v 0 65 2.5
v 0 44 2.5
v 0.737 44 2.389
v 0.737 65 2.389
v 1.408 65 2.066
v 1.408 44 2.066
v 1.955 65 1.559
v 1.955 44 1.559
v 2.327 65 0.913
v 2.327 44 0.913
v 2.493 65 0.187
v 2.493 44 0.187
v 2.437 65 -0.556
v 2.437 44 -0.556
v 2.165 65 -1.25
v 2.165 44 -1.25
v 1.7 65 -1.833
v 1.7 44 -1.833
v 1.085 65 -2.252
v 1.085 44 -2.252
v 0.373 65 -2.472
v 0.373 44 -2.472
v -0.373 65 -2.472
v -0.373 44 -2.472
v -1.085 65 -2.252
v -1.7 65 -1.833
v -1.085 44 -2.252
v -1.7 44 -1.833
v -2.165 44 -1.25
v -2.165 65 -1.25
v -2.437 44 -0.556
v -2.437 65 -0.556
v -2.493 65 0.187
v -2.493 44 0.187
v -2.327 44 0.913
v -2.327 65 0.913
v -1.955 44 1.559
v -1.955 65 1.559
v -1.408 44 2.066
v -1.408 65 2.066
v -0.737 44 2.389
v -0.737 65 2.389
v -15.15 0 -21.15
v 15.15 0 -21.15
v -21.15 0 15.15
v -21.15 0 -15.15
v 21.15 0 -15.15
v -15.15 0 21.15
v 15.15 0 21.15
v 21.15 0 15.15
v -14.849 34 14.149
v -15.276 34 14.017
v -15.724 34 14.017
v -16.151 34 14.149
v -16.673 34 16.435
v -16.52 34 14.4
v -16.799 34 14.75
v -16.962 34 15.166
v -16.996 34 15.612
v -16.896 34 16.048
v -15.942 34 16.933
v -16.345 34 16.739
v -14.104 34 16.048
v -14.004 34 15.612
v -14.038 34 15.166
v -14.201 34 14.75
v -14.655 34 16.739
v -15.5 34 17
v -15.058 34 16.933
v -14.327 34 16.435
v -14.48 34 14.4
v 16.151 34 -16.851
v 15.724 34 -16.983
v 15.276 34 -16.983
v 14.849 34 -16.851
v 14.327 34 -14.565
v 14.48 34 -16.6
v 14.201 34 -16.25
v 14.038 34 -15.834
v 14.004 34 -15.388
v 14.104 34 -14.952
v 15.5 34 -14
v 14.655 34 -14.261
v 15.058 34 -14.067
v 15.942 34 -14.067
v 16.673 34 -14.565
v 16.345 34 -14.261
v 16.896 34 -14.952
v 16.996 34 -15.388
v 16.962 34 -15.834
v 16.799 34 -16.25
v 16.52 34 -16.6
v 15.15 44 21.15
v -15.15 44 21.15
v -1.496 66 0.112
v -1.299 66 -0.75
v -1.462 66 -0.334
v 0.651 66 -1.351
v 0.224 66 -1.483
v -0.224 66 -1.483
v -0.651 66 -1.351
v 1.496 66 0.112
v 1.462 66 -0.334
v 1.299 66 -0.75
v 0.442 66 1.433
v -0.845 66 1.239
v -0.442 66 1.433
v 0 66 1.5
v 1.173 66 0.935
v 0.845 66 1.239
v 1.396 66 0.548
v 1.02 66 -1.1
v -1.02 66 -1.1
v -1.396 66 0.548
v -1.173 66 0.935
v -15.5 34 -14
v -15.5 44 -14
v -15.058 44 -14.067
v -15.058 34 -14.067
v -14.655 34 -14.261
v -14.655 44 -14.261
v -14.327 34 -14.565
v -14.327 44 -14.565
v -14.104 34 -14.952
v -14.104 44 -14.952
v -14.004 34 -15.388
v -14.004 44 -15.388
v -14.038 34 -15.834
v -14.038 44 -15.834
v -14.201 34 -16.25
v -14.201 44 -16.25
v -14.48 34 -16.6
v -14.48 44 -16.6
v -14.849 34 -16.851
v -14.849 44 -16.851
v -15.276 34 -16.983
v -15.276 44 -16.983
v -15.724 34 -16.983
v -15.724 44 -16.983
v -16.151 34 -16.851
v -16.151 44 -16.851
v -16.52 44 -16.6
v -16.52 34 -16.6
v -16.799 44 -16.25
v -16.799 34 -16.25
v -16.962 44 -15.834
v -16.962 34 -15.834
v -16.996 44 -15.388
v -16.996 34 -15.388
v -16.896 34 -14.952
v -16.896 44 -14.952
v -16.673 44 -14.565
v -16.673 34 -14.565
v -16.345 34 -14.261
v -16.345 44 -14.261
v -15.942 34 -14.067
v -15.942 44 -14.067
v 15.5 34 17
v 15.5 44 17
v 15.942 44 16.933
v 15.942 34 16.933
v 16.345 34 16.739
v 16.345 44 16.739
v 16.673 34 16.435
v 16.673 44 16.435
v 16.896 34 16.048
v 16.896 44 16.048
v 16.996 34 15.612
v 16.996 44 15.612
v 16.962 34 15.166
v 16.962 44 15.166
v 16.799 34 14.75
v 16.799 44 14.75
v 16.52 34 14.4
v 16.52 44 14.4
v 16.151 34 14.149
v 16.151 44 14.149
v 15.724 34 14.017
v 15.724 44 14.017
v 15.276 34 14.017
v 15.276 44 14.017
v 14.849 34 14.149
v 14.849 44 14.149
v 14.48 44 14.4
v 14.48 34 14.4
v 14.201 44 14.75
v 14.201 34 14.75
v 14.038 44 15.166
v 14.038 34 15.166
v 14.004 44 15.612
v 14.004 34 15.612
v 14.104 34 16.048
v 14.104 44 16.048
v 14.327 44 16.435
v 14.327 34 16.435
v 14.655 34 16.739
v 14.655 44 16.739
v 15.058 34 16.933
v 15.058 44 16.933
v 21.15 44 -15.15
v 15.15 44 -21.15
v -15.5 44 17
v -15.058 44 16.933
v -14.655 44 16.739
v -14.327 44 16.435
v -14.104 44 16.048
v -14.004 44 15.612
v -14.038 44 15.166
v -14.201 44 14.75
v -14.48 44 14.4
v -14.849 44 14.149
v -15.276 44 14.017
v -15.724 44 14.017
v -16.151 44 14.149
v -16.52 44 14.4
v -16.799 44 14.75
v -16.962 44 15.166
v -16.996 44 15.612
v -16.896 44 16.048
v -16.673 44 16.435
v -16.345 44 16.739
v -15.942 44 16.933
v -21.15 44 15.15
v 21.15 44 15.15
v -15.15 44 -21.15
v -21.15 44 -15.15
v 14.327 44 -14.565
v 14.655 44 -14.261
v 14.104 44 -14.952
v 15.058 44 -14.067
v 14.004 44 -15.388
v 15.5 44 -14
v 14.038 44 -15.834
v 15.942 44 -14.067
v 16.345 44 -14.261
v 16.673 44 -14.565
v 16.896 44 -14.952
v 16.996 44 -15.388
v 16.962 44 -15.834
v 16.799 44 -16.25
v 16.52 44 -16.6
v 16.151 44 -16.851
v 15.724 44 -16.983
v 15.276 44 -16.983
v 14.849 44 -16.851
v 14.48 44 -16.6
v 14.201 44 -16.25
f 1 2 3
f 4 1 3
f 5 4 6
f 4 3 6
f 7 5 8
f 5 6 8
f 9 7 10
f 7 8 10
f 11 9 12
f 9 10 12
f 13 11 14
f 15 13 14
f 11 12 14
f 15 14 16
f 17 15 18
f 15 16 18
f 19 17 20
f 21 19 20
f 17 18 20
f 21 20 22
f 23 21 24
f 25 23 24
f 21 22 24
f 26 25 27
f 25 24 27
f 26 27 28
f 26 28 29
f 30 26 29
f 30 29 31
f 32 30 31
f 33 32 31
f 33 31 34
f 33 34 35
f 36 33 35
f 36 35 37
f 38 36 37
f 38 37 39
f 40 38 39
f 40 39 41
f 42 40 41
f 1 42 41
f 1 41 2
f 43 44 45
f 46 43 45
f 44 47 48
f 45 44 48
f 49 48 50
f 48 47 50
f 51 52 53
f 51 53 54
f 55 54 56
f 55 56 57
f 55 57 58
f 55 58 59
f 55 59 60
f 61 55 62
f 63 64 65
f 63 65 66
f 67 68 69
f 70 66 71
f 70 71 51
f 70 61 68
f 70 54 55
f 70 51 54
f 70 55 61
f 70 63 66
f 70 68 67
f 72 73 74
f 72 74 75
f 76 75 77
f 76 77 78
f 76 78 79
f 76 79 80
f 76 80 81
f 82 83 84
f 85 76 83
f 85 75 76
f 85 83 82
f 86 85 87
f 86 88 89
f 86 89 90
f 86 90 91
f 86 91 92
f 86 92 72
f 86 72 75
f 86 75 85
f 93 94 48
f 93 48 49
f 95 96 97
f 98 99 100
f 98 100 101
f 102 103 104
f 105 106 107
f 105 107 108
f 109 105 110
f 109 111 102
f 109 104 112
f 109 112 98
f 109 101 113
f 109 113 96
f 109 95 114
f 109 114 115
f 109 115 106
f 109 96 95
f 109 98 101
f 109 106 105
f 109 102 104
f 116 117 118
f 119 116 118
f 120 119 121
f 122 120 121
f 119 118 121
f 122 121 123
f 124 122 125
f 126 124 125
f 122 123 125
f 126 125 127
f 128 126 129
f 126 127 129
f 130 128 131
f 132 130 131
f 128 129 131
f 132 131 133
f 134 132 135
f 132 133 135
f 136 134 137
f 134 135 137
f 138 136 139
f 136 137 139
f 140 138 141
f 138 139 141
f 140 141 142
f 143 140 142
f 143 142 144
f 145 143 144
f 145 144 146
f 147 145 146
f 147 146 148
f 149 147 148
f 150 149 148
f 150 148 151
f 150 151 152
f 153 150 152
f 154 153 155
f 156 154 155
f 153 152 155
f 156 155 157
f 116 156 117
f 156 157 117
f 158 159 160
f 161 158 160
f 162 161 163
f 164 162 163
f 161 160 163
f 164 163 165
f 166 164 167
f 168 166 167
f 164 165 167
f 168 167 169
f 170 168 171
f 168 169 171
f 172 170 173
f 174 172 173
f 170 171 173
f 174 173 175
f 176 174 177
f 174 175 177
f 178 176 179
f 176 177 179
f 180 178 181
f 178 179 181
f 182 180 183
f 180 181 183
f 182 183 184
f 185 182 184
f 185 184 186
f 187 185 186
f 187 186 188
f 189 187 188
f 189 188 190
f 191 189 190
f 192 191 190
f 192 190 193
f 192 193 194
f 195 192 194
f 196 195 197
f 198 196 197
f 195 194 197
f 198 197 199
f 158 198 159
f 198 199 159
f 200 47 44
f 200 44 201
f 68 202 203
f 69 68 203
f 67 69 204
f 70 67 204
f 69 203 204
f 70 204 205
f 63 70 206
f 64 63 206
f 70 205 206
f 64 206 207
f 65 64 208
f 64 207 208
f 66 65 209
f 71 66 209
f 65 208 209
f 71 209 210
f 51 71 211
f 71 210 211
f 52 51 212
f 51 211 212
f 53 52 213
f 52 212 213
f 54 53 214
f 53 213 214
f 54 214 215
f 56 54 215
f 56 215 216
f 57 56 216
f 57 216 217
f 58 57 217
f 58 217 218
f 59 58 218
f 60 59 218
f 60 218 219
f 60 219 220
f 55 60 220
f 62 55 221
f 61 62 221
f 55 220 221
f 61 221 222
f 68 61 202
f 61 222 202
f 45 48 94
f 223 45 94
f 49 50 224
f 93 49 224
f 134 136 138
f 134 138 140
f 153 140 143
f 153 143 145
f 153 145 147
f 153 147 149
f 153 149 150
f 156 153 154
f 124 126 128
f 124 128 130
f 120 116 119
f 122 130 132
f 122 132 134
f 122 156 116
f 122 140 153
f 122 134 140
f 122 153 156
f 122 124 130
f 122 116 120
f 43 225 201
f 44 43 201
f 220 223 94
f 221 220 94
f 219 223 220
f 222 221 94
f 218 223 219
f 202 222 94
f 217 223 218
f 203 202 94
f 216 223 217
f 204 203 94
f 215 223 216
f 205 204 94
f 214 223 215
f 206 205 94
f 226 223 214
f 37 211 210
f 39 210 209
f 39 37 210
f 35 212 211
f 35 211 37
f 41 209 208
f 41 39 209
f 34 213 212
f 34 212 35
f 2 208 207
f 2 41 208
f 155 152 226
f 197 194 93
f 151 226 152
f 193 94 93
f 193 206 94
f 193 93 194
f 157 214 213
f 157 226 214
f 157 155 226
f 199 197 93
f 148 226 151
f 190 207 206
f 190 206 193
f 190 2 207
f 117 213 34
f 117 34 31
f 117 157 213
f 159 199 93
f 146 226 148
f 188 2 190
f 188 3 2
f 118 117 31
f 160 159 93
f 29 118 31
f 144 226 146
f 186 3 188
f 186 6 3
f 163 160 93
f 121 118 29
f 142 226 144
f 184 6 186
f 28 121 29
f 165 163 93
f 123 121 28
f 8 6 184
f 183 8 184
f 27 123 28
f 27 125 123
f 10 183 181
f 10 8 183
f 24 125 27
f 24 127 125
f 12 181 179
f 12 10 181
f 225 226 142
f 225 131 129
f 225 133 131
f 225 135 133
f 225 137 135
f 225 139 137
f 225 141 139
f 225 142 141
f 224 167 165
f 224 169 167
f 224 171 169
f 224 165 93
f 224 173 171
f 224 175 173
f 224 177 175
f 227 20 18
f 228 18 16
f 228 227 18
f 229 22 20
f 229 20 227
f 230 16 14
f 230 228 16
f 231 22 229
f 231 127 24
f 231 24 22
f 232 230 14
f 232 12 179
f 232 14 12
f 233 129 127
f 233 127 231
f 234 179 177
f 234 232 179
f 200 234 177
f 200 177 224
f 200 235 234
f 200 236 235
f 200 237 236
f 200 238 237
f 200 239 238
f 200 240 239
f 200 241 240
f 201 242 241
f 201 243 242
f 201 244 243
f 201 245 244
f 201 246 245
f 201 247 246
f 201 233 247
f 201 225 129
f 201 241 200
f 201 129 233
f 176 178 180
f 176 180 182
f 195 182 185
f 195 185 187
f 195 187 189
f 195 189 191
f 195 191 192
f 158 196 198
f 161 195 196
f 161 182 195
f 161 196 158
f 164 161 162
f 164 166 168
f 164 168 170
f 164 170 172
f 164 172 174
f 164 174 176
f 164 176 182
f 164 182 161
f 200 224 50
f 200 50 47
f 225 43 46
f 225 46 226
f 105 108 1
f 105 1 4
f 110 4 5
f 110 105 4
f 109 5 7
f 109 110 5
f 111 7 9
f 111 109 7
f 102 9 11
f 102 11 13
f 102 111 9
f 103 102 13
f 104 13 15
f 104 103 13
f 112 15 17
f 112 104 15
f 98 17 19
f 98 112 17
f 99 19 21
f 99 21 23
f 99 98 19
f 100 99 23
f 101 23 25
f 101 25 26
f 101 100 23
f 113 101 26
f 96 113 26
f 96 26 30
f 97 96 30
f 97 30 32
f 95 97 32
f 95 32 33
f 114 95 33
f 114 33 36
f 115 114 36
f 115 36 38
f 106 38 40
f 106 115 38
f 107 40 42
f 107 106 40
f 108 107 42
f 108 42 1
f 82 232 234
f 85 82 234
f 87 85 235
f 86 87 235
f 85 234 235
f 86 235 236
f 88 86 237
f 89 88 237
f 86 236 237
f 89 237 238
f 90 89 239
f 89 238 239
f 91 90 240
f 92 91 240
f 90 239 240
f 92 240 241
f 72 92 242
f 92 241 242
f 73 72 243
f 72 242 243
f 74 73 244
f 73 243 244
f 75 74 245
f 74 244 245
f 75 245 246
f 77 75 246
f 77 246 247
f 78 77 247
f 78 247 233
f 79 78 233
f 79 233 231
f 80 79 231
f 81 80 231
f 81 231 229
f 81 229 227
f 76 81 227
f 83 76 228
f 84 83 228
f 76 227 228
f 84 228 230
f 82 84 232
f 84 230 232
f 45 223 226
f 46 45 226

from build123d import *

# Parameters (mm, degrees)
SKETCH1_W           = 42.3
SKETCH1_H           = 42.3
SKETCH1_R           = 2.5
BOSS_EXTRUDE1_DEPTH = 44
SKETCH1_3_R         = 2.5
BOSS_EXTRUDE2_DEPTH = 66
CHAMFER1_SIZE       = 6
CHAMFER2_SIZE       = 1
SKETCH2_R           = 1.5
CUT_EXTRUDE1_DEPTH  = 10


with BuildPart() as part:
    # Sketch1 → Boss-Extrude1 (new body)
    with BuildSketch(Plane(origin=(0, 0, 0), x_dir=(1, 0, 0), z_dir=(0, 1, 0))):
        Rectangle(SKETCH1_W, SKETCH1_H)
        Circle(SKETCH1_R, mode=Mode.SUBTRACT)
        Circle(SKETCH1_R)
    extrude(amount=BOSS_EXTRUDE1_DEPTH)

    # Sketch1_3 → Boss-Extrude2 (add)
    with BuildSketch(Plane(origin=(0, 0, 0), x_dir=(1, 0, 0), z_dir=(0, 1, 0))):
        with Locations(Location((0, 0, 0), (0, 0, 270))):  # turned: the seam where the file's is
            Circle(SKETCH1_3_R)
    extrude(amount=BOSS_EXTRUDE2_DEPTH)

    # Chamfer1
    chamfer1_edges = [part.edges().sort_by_distance(p)[0] for p in [
        (21.15, 22, 21.15),
        (-21.15, 22, 21.15),
        (-21.15, 22, -21.15),
        (21.15, 22, -21.15),
    ]]
    chamfer(chamfer1_edges, length=CHAMFER1_SIZE)

    # Chamfer2
    chamfer2_edges = [part.edges().sort_by_distance(p)[0] for p in [
        (0, 66, -2.5),
    ]]
    chamfer(chamfer2_edges, length=CHAMFER2_SIZE)

    # Sketch2 → Cut-Extrude1 (cut)
    with BuildSketch(Plane(origin=(0, 44, 0), x_dir=(1, 0, 0), z_dir=(0, 1, 0))):
        with Locations(Location((-15.5, 15.5, 0), (0, 0, 270))):  # turned: the seam where the file's is
            Circle(SKETCH2_R)
        with Locations(Location((15.5, 15.5, 0), (0, 0, 270))):  # turned: the seam where the file's is
            Circle(SKETCH2_R)
        with Locations(Location((15.5, -15.5, 0), (0, 0, 270))):  # turned: the seam where the file's is
            Circle(SKETCH2_R)
        with Locations(Location((-15.5, -15.5, 0), (0, 0, 270))):  # turned: the seam where the file's is
            Circle(SKETCH2_R)
    extrude(amount=-CUT_EXTRUDE1_DEPTH, mode=Mode.SUBTRACT)


solid = part.part
